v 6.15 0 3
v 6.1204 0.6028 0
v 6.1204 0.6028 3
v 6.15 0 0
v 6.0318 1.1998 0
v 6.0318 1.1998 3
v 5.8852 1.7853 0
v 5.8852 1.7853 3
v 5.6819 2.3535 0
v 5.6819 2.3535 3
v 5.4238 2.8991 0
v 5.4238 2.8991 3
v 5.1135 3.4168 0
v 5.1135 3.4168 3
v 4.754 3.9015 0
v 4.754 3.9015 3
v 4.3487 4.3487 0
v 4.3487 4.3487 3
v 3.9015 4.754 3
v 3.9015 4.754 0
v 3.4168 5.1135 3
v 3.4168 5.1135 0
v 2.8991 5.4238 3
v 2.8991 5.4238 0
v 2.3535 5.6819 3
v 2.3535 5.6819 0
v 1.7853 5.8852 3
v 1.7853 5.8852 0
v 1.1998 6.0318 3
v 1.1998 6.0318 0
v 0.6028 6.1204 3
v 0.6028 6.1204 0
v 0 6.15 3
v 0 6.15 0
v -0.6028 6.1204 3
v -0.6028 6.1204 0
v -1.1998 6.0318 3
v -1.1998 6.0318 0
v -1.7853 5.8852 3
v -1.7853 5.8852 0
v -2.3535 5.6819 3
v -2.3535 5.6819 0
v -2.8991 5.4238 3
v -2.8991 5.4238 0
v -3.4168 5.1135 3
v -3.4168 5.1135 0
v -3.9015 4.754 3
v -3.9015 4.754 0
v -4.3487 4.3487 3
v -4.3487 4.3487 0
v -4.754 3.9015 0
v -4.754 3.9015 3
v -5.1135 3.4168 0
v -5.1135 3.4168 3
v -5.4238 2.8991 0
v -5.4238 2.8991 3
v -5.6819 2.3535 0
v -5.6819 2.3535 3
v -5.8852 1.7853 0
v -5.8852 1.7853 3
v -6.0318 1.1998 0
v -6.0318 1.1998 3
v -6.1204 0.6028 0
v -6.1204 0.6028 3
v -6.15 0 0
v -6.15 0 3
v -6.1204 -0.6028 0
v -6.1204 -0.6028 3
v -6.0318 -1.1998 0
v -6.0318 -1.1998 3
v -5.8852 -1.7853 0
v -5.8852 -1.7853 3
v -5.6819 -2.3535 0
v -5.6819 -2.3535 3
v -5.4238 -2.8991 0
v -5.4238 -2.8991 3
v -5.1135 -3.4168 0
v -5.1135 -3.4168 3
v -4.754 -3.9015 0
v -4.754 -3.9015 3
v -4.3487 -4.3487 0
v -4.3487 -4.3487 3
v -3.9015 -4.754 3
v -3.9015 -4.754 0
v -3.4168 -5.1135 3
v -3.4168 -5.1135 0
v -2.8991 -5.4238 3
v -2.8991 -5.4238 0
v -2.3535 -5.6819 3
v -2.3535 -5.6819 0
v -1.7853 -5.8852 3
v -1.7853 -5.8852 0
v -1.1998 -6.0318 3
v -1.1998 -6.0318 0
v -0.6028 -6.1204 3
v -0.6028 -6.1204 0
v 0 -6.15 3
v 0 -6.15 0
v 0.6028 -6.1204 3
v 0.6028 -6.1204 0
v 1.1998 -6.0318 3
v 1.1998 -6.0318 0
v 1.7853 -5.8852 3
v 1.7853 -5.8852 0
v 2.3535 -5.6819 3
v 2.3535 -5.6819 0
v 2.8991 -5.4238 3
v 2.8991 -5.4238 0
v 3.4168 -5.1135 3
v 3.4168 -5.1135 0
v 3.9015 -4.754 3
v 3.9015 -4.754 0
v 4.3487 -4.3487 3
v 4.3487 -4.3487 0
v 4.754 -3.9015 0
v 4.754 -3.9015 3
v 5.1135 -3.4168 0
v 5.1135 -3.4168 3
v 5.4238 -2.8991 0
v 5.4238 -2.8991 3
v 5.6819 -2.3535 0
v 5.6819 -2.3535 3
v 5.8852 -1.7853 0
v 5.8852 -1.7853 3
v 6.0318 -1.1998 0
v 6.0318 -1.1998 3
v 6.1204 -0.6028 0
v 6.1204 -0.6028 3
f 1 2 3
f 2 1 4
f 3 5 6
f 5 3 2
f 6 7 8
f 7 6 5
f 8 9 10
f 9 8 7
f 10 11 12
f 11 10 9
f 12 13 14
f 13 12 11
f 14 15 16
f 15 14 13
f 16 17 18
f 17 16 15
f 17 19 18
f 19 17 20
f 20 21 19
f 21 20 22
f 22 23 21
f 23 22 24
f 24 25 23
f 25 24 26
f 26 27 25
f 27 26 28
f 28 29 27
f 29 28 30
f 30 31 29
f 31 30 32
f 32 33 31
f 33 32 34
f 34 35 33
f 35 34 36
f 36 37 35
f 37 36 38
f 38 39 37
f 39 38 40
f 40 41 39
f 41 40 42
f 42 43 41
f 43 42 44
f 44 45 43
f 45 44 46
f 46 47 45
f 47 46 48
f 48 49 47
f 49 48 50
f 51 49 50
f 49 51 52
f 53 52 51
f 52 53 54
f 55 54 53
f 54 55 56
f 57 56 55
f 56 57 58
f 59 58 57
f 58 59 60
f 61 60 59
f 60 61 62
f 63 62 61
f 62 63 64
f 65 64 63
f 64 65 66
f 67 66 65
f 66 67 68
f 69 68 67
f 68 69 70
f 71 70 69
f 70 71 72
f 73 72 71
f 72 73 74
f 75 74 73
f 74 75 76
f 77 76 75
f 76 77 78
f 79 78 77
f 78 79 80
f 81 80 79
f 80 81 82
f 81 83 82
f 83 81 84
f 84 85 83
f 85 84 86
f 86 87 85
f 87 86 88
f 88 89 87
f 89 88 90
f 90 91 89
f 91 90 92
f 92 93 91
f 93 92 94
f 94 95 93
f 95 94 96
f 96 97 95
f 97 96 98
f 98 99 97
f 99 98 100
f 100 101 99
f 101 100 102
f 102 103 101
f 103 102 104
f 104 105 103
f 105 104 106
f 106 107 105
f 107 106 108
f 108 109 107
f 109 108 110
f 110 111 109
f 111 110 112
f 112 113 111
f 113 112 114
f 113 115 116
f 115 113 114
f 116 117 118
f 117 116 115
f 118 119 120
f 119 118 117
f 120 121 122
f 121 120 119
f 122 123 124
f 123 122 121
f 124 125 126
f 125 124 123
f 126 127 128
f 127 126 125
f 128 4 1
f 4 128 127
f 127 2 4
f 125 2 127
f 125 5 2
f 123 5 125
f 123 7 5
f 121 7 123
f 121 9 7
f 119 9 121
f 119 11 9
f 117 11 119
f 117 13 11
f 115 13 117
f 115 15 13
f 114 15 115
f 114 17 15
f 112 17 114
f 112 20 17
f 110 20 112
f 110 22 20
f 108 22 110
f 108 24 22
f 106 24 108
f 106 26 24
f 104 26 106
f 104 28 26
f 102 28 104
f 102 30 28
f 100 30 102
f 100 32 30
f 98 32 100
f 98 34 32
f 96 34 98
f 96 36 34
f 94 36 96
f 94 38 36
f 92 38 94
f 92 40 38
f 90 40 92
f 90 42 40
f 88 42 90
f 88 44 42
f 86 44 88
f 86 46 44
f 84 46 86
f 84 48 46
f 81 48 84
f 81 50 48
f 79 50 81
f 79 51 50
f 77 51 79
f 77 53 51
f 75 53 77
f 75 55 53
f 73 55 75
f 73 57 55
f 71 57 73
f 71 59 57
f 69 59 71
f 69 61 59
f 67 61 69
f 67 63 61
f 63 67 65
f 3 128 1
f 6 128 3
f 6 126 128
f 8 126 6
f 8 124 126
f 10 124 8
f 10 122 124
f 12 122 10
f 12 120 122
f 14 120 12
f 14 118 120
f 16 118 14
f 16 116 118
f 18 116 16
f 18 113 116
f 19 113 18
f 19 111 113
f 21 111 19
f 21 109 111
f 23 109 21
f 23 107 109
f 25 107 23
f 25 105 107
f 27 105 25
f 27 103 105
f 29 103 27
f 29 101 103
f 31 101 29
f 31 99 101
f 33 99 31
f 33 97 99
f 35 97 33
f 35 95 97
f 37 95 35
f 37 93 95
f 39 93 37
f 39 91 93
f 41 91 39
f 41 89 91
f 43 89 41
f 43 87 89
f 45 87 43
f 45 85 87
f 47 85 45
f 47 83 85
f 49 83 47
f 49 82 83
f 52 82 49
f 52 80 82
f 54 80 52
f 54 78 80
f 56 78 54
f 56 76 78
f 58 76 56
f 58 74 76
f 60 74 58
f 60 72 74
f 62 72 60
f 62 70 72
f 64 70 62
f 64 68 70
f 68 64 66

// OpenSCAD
// foot — TPU 95A, print 4. See tool_carousel_common.scad for the design notes.
include <tool_carousel_common.scad>
foot();
